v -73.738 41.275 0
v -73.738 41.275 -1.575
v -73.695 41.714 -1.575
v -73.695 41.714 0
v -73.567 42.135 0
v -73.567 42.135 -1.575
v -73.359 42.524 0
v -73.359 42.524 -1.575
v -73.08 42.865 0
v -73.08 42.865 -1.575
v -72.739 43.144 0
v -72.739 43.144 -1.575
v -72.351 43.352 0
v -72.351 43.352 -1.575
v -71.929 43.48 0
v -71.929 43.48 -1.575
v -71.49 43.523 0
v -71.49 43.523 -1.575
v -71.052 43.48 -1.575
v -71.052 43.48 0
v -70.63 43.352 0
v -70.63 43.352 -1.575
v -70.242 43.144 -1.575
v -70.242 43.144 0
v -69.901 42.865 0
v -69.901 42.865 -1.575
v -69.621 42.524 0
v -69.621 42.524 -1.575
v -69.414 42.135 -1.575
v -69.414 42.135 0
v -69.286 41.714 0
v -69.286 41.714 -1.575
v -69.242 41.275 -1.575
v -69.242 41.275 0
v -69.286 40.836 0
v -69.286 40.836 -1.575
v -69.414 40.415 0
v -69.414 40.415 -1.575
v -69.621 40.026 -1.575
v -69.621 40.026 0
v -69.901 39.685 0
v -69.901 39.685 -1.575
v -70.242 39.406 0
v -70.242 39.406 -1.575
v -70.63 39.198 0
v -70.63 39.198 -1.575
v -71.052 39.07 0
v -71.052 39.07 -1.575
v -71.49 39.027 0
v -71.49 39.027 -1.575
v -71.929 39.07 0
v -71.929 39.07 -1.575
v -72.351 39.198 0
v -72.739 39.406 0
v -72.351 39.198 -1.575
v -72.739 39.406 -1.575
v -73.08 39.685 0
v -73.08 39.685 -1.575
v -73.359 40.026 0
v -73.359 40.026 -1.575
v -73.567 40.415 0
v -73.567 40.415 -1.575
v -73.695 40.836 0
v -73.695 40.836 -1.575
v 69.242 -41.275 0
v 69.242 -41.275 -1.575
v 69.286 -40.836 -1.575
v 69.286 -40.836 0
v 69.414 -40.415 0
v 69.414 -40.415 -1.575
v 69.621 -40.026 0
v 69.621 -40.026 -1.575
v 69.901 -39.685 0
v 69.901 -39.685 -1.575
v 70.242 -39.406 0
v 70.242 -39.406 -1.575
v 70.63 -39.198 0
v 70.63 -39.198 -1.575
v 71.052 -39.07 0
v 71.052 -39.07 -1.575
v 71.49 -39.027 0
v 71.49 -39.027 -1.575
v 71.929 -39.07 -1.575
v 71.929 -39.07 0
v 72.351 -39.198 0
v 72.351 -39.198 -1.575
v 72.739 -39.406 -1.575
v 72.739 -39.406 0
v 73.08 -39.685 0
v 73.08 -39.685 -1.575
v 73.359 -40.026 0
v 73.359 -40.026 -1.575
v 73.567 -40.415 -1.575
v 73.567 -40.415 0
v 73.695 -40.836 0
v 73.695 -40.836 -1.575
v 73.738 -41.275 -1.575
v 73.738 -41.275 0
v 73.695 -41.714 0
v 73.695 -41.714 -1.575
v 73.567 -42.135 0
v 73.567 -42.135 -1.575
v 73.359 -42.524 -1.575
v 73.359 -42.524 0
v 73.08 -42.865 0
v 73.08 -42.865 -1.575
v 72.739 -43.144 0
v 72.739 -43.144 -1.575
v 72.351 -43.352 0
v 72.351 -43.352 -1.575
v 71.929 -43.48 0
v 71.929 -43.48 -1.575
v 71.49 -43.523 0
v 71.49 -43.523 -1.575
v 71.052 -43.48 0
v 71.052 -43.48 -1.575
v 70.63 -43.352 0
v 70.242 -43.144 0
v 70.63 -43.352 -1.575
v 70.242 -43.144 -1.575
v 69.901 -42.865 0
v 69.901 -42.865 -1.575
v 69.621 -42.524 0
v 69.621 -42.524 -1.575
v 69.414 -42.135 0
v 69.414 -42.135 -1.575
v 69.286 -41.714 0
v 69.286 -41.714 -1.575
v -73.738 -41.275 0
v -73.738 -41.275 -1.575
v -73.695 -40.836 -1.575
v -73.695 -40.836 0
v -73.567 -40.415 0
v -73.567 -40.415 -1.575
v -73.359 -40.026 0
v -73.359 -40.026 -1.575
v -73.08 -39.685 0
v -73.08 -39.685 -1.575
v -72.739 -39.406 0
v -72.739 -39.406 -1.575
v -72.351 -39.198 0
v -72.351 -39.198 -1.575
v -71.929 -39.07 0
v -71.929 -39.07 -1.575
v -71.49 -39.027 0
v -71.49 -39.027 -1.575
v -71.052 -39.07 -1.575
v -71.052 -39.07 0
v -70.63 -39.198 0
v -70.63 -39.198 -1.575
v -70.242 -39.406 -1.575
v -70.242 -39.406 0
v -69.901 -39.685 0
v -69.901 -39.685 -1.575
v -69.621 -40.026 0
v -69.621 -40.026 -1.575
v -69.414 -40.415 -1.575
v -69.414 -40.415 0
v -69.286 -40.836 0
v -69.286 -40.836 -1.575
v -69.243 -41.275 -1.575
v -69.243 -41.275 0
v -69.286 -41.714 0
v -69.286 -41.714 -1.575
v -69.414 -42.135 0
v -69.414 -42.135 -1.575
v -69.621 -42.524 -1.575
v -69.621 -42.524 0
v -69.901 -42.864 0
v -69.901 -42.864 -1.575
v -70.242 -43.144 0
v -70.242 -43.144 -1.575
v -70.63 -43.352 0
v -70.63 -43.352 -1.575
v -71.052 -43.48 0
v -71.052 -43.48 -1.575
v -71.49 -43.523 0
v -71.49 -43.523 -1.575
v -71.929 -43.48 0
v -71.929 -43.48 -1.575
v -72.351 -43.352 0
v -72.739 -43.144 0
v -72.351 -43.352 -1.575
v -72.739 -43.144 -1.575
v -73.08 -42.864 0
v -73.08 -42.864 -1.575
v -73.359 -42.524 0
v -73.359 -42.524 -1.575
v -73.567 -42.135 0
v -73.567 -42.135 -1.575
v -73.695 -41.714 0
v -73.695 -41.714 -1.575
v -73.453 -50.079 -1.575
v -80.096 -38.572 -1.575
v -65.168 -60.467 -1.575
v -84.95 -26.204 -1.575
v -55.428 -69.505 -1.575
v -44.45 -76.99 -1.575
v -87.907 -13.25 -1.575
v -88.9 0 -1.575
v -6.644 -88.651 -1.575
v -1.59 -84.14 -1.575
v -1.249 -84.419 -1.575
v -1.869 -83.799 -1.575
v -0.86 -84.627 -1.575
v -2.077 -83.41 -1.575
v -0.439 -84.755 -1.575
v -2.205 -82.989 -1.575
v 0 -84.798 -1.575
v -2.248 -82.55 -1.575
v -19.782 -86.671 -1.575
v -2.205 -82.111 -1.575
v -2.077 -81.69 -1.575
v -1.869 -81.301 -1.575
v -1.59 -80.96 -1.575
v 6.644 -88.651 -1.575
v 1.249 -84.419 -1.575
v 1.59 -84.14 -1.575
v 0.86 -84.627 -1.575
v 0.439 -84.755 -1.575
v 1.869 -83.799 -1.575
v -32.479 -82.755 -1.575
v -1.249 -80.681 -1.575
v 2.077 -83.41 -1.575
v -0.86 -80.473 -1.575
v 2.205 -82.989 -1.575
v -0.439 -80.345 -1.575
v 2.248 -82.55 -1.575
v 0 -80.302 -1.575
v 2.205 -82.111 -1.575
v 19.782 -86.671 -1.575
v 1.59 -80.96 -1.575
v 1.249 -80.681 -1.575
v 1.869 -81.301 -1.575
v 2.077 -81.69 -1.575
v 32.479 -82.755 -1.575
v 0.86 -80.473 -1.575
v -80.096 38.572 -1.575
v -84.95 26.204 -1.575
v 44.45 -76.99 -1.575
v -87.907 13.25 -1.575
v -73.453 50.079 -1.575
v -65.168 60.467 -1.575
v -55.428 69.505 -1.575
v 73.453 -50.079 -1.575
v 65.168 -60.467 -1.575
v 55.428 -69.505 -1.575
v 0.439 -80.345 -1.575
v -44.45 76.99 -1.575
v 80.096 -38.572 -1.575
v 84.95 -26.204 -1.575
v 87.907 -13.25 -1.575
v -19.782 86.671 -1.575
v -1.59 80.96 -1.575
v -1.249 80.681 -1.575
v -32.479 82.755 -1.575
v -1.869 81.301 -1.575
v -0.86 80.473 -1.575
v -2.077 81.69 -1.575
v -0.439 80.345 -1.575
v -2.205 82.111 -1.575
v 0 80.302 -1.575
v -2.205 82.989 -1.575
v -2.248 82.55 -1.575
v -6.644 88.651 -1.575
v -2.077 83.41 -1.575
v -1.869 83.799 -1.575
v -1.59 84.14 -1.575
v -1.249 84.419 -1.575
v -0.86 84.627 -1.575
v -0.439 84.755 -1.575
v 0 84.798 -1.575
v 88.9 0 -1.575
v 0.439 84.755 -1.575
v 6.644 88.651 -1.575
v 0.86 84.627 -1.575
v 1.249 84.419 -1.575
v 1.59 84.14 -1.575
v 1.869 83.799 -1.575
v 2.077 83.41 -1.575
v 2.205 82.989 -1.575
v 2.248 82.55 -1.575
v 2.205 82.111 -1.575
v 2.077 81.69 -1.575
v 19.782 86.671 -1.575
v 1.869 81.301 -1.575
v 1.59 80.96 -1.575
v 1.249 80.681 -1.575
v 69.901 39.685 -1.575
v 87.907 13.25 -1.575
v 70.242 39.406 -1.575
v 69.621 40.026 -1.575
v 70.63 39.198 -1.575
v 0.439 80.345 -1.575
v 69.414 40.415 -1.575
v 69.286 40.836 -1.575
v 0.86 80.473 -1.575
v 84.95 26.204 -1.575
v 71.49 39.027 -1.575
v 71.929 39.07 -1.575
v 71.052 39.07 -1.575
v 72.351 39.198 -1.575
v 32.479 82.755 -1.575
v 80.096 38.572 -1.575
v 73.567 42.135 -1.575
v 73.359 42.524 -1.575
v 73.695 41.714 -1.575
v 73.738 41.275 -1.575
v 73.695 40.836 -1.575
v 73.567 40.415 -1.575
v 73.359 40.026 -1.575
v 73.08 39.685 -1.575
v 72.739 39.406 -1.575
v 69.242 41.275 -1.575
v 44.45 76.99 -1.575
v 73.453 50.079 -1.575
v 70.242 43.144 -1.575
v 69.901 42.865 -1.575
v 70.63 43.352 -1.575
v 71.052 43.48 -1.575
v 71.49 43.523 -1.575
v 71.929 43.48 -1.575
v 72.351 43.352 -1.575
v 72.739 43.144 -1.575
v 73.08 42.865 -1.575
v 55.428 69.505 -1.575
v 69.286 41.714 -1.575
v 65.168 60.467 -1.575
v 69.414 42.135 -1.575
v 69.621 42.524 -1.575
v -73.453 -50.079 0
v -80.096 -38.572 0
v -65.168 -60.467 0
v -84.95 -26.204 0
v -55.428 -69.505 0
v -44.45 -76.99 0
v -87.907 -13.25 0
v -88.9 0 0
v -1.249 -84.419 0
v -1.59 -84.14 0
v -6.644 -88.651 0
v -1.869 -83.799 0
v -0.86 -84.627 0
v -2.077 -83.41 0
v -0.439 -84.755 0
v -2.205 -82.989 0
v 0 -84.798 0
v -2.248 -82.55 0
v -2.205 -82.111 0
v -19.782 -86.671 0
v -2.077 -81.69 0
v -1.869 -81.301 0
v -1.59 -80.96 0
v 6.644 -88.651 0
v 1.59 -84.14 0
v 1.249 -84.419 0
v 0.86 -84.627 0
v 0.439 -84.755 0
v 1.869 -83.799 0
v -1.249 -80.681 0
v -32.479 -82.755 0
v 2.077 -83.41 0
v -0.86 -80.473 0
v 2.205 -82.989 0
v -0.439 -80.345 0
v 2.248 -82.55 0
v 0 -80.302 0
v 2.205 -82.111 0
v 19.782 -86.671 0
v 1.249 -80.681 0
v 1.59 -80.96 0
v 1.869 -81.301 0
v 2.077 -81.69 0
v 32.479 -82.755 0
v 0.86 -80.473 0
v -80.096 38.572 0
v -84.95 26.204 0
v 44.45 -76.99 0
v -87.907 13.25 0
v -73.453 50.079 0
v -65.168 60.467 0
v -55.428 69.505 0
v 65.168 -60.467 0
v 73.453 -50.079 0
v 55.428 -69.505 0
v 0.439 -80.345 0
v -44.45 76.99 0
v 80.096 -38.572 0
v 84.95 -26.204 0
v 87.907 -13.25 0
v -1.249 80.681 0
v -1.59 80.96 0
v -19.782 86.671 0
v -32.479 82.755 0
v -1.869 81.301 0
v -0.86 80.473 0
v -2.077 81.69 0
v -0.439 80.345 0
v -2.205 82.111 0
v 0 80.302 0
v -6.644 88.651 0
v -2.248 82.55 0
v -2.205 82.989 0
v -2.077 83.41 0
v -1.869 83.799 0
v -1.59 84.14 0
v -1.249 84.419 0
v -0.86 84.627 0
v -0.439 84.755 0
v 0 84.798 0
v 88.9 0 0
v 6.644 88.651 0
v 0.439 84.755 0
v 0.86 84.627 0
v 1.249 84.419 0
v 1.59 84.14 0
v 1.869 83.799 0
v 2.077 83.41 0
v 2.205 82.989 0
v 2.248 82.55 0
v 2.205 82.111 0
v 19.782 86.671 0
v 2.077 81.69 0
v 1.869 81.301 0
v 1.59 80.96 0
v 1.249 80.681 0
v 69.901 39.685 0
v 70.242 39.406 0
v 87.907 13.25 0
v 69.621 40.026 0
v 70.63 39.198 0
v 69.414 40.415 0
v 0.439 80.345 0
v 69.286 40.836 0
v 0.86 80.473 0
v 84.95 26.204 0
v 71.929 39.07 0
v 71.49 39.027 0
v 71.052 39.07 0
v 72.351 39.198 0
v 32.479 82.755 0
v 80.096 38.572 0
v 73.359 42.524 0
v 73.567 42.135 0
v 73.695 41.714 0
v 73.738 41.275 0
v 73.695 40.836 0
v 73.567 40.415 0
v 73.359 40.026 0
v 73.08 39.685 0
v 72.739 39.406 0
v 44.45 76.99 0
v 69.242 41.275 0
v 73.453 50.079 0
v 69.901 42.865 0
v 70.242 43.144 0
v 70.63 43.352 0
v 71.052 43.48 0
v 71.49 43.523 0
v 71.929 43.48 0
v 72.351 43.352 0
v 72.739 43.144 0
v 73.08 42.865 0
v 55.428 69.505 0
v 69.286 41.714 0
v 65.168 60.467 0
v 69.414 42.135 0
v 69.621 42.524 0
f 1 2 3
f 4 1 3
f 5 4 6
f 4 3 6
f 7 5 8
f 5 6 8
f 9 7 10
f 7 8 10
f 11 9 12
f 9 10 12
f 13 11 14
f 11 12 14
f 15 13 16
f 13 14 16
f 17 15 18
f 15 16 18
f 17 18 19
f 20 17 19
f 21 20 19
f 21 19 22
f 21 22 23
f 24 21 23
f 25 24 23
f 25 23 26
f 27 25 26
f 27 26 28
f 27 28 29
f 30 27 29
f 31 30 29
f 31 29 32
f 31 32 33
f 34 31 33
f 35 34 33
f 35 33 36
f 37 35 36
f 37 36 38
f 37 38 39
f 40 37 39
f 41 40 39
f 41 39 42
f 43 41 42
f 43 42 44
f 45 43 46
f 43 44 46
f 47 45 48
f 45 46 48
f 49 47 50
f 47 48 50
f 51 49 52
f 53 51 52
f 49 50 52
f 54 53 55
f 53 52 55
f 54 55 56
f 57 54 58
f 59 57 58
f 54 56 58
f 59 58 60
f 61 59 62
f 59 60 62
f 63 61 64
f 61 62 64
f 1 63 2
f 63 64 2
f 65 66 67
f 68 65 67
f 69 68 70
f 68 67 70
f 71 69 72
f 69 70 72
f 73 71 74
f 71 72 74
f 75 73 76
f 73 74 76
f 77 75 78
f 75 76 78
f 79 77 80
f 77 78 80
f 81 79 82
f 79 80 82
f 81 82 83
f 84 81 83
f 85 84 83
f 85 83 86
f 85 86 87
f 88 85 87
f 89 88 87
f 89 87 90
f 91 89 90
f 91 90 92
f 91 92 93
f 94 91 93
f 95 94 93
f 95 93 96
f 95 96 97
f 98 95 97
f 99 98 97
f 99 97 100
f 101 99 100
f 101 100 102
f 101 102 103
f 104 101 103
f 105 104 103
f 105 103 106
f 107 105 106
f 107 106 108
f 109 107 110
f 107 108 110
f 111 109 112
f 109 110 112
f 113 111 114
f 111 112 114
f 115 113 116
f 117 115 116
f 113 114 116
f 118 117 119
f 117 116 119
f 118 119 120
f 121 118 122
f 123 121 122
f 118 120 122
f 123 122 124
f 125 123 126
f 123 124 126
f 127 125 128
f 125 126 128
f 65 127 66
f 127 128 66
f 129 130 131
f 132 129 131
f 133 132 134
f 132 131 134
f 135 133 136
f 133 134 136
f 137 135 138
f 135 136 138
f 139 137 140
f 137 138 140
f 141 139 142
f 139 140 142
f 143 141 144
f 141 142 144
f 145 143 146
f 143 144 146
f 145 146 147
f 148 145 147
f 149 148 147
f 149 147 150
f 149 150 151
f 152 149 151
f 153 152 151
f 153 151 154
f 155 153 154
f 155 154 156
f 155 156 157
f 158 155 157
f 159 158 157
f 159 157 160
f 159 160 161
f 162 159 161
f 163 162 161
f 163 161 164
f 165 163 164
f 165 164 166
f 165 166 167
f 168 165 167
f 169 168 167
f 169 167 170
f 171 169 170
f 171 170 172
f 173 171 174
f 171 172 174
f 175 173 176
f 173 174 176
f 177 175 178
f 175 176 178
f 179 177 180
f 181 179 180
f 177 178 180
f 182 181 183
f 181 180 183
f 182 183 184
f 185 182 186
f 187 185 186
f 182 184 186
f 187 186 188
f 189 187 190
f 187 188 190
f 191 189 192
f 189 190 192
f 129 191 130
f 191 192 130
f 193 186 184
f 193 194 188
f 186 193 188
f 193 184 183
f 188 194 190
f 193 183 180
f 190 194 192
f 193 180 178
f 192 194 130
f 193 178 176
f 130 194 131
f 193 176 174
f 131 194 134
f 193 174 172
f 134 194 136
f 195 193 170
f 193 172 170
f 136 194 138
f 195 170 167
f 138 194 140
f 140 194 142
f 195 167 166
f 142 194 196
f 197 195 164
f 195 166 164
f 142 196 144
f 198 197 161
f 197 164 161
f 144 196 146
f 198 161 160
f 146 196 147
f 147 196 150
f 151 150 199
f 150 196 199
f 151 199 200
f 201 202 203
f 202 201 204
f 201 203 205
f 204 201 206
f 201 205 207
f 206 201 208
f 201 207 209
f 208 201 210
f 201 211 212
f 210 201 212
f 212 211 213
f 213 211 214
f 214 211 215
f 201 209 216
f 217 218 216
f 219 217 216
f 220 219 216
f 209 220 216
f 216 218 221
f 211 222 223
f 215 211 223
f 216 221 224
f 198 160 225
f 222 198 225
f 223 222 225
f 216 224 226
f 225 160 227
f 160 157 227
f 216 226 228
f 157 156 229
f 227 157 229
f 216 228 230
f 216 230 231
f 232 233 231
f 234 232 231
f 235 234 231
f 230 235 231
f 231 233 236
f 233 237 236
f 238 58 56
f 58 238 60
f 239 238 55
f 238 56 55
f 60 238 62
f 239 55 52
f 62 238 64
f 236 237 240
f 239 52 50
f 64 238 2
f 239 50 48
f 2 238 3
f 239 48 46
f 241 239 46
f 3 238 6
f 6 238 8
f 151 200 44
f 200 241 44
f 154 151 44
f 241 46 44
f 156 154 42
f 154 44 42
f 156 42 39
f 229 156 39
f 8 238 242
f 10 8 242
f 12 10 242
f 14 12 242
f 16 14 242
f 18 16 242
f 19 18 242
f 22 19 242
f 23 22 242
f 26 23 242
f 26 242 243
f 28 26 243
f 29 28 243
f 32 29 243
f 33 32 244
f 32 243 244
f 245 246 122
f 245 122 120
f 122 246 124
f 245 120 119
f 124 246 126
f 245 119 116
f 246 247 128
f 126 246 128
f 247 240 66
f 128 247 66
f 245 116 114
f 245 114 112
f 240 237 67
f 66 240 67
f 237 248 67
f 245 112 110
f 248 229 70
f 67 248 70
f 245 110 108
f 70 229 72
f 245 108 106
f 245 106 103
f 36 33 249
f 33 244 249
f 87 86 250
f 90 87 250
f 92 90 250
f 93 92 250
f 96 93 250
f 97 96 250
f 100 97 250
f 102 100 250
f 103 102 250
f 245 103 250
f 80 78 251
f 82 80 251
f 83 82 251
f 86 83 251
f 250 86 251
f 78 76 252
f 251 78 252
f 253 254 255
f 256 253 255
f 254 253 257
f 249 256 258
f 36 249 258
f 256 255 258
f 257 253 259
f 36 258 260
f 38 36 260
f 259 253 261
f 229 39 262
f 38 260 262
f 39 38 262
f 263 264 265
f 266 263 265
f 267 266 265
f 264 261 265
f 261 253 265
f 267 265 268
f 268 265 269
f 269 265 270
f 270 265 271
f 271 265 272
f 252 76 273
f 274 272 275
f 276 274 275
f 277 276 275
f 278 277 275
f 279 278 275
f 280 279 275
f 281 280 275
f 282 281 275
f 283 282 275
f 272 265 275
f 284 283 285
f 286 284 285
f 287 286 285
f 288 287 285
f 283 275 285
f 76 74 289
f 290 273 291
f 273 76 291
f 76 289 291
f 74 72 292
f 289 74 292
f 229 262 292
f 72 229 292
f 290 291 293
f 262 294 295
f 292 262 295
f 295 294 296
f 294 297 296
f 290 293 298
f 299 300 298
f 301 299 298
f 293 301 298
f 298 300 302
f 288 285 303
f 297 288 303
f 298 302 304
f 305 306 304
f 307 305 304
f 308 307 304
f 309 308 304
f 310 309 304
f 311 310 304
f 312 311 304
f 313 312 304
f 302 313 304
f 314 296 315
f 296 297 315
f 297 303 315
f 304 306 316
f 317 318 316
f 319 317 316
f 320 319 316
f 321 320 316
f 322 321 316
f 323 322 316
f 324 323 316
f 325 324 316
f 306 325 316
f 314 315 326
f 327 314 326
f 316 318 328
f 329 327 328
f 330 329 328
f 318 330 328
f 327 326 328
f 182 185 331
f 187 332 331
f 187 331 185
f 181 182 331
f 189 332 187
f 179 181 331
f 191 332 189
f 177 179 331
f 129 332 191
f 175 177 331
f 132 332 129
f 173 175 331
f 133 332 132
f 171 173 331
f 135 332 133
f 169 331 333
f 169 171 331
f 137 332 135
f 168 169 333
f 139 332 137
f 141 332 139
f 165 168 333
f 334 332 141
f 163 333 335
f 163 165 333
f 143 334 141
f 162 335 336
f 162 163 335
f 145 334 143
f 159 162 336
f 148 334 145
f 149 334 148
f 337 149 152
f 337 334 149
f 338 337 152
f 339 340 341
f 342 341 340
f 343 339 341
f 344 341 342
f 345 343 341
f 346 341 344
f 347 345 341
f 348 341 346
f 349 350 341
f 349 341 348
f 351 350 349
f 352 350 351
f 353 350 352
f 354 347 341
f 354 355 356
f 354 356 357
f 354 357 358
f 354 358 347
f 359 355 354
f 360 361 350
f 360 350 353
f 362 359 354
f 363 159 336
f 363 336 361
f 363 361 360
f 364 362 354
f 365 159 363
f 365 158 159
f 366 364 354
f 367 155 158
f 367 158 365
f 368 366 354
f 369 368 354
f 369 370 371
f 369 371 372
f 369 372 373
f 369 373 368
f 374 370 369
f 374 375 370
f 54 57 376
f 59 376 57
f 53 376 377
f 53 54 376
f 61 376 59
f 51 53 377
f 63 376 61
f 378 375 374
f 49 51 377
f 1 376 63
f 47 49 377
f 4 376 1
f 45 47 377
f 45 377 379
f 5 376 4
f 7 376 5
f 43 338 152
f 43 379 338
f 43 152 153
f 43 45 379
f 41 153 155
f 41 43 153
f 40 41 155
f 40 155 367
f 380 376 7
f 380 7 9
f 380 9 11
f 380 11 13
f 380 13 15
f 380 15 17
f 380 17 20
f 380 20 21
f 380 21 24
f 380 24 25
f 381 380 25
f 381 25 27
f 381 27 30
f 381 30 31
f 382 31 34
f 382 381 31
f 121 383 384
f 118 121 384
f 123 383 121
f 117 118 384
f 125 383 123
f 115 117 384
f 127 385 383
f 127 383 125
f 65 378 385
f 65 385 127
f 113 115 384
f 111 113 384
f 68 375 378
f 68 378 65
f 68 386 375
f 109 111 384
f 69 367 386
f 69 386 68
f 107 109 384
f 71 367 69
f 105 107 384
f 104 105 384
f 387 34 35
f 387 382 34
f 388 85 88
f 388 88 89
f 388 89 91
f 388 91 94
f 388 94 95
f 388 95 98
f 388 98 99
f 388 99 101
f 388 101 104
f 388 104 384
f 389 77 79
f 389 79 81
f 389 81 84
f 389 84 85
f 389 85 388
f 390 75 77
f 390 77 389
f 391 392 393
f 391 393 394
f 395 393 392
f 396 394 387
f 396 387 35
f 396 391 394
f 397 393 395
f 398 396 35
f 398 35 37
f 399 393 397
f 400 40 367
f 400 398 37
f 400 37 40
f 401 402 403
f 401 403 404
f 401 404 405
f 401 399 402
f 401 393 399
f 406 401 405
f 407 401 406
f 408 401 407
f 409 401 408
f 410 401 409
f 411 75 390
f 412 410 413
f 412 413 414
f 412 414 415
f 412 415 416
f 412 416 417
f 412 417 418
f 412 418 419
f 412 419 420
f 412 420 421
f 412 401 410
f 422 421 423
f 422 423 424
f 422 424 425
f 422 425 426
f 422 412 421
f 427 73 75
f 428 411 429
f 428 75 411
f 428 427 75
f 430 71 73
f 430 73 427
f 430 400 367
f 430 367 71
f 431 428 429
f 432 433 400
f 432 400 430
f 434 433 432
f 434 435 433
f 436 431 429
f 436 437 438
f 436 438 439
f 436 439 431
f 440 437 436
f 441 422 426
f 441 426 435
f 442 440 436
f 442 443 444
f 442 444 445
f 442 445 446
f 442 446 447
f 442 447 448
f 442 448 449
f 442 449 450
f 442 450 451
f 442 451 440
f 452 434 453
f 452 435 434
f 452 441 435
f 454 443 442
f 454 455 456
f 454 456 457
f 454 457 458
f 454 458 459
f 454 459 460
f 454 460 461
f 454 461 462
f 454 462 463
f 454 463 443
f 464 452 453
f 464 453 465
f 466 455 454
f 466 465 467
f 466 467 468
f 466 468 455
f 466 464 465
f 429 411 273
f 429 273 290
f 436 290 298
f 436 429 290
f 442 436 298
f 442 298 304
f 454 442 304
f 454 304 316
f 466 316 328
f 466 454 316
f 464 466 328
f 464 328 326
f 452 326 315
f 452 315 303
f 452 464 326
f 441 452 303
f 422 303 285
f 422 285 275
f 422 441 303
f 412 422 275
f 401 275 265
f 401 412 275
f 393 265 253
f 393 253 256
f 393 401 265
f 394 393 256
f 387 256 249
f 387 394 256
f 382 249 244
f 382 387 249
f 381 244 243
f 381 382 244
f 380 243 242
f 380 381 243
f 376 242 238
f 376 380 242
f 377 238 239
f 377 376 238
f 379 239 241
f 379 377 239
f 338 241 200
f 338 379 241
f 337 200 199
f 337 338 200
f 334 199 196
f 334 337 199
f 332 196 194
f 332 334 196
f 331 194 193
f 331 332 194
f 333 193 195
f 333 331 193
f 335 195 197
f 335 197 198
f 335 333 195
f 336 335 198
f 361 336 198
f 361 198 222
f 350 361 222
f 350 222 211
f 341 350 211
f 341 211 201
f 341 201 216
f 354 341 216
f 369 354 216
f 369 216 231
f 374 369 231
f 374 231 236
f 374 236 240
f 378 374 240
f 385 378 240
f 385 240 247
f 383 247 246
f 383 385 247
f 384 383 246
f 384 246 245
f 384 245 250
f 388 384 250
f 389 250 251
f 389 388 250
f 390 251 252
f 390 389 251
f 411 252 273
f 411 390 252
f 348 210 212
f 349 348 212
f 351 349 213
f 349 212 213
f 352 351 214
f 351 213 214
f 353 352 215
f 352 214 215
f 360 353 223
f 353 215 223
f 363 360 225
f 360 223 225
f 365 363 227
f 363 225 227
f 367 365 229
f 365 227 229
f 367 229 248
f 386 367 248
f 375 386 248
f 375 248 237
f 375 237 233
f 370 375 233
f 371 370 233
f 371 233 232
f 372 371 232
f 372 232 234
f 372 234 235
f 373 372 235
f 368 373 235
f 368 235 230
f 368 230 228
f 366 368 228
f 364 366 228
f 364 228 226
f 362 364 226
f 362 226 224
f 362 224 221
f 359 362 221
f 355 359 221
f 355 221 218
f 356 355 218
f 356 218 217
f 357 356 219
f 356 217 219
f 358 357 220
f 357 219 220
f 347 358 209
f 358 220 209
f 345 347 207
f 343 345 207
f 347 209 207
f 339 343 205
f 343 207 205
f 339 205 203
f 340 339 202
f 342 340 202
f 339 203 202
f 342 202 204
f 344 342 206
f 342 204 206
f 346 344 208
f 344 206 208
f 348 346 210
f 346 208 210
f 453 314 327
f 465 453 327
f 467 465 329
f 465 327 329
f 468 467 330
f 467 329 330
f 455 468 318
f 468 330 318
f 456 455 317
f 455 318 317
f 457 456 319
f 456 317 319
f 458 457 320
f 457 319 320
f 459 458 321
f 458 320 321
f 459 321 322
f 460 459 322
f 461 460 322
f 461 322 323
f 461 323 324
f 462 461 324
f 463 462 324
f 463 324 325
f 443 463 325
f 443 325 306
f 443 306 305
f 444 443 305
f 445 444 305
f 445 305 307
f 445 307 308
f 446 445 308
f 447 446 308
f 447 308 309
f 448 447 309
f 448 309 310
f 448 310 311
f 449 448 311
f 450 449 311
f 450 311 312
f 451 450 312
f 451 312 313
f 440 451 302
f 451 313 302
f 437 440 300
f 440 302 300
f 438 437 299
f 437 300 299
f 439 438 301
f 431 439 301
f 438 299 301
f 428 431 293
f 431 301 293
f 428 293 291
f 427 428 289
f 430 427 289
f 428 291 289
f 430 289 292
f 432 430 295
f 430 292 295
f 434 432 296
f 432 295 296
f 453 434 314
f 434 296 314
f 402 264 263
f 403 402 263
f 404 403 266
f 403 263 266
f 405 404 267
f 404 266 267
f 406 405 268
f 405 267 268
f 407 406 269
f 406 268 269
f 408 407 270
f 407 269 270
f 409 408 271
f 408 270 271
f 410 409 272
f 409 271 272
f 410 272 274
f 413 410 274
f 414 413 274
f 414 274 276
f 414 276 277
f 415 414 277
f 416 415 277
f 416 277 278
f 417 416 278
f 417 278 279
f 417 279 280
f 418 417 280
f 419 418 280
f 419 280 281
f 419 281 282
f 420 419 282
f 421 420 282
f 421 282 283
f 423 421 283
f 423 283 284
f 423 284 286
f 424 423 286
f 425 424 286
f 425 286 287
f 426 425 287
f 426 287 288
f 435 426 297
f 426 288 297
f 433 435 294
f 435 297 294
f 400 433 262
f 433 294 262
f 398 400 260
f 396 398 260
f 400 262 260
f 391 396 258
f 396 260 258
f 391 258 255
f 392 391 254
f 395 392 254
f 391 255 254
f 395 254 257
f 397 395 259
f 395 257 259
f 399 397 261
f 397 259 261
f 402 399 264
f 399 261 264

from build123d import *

# Parameters (mm, degrees)
F0_R     = 88.9
F1_DEPTH = 1.5748
F3_D     = 4.4958
F5_D     = 4.4958


with BuildPart() as f1:
    # F0 (on Top) → F1 (new body)
    with BuildSketch(Plane.XY):
        Circle(F0_R)
    extrude(amount=-F1_DEPTH)

    # F3 (through all)
    with Locations(Plane.XY):
        with Locations((0, 82.55), (-71.490402, -41.274992), (71.490395, -41.275004)):
            Hole(F3_D / 2)

    # F5 (through all)
    with Locations(Plane.XY):
        with Locations((0, -82.55), (71.490397, 41.275), (-71.490397, 41.275)):
            Hole(F5_D / 2)


solid = f1.part
